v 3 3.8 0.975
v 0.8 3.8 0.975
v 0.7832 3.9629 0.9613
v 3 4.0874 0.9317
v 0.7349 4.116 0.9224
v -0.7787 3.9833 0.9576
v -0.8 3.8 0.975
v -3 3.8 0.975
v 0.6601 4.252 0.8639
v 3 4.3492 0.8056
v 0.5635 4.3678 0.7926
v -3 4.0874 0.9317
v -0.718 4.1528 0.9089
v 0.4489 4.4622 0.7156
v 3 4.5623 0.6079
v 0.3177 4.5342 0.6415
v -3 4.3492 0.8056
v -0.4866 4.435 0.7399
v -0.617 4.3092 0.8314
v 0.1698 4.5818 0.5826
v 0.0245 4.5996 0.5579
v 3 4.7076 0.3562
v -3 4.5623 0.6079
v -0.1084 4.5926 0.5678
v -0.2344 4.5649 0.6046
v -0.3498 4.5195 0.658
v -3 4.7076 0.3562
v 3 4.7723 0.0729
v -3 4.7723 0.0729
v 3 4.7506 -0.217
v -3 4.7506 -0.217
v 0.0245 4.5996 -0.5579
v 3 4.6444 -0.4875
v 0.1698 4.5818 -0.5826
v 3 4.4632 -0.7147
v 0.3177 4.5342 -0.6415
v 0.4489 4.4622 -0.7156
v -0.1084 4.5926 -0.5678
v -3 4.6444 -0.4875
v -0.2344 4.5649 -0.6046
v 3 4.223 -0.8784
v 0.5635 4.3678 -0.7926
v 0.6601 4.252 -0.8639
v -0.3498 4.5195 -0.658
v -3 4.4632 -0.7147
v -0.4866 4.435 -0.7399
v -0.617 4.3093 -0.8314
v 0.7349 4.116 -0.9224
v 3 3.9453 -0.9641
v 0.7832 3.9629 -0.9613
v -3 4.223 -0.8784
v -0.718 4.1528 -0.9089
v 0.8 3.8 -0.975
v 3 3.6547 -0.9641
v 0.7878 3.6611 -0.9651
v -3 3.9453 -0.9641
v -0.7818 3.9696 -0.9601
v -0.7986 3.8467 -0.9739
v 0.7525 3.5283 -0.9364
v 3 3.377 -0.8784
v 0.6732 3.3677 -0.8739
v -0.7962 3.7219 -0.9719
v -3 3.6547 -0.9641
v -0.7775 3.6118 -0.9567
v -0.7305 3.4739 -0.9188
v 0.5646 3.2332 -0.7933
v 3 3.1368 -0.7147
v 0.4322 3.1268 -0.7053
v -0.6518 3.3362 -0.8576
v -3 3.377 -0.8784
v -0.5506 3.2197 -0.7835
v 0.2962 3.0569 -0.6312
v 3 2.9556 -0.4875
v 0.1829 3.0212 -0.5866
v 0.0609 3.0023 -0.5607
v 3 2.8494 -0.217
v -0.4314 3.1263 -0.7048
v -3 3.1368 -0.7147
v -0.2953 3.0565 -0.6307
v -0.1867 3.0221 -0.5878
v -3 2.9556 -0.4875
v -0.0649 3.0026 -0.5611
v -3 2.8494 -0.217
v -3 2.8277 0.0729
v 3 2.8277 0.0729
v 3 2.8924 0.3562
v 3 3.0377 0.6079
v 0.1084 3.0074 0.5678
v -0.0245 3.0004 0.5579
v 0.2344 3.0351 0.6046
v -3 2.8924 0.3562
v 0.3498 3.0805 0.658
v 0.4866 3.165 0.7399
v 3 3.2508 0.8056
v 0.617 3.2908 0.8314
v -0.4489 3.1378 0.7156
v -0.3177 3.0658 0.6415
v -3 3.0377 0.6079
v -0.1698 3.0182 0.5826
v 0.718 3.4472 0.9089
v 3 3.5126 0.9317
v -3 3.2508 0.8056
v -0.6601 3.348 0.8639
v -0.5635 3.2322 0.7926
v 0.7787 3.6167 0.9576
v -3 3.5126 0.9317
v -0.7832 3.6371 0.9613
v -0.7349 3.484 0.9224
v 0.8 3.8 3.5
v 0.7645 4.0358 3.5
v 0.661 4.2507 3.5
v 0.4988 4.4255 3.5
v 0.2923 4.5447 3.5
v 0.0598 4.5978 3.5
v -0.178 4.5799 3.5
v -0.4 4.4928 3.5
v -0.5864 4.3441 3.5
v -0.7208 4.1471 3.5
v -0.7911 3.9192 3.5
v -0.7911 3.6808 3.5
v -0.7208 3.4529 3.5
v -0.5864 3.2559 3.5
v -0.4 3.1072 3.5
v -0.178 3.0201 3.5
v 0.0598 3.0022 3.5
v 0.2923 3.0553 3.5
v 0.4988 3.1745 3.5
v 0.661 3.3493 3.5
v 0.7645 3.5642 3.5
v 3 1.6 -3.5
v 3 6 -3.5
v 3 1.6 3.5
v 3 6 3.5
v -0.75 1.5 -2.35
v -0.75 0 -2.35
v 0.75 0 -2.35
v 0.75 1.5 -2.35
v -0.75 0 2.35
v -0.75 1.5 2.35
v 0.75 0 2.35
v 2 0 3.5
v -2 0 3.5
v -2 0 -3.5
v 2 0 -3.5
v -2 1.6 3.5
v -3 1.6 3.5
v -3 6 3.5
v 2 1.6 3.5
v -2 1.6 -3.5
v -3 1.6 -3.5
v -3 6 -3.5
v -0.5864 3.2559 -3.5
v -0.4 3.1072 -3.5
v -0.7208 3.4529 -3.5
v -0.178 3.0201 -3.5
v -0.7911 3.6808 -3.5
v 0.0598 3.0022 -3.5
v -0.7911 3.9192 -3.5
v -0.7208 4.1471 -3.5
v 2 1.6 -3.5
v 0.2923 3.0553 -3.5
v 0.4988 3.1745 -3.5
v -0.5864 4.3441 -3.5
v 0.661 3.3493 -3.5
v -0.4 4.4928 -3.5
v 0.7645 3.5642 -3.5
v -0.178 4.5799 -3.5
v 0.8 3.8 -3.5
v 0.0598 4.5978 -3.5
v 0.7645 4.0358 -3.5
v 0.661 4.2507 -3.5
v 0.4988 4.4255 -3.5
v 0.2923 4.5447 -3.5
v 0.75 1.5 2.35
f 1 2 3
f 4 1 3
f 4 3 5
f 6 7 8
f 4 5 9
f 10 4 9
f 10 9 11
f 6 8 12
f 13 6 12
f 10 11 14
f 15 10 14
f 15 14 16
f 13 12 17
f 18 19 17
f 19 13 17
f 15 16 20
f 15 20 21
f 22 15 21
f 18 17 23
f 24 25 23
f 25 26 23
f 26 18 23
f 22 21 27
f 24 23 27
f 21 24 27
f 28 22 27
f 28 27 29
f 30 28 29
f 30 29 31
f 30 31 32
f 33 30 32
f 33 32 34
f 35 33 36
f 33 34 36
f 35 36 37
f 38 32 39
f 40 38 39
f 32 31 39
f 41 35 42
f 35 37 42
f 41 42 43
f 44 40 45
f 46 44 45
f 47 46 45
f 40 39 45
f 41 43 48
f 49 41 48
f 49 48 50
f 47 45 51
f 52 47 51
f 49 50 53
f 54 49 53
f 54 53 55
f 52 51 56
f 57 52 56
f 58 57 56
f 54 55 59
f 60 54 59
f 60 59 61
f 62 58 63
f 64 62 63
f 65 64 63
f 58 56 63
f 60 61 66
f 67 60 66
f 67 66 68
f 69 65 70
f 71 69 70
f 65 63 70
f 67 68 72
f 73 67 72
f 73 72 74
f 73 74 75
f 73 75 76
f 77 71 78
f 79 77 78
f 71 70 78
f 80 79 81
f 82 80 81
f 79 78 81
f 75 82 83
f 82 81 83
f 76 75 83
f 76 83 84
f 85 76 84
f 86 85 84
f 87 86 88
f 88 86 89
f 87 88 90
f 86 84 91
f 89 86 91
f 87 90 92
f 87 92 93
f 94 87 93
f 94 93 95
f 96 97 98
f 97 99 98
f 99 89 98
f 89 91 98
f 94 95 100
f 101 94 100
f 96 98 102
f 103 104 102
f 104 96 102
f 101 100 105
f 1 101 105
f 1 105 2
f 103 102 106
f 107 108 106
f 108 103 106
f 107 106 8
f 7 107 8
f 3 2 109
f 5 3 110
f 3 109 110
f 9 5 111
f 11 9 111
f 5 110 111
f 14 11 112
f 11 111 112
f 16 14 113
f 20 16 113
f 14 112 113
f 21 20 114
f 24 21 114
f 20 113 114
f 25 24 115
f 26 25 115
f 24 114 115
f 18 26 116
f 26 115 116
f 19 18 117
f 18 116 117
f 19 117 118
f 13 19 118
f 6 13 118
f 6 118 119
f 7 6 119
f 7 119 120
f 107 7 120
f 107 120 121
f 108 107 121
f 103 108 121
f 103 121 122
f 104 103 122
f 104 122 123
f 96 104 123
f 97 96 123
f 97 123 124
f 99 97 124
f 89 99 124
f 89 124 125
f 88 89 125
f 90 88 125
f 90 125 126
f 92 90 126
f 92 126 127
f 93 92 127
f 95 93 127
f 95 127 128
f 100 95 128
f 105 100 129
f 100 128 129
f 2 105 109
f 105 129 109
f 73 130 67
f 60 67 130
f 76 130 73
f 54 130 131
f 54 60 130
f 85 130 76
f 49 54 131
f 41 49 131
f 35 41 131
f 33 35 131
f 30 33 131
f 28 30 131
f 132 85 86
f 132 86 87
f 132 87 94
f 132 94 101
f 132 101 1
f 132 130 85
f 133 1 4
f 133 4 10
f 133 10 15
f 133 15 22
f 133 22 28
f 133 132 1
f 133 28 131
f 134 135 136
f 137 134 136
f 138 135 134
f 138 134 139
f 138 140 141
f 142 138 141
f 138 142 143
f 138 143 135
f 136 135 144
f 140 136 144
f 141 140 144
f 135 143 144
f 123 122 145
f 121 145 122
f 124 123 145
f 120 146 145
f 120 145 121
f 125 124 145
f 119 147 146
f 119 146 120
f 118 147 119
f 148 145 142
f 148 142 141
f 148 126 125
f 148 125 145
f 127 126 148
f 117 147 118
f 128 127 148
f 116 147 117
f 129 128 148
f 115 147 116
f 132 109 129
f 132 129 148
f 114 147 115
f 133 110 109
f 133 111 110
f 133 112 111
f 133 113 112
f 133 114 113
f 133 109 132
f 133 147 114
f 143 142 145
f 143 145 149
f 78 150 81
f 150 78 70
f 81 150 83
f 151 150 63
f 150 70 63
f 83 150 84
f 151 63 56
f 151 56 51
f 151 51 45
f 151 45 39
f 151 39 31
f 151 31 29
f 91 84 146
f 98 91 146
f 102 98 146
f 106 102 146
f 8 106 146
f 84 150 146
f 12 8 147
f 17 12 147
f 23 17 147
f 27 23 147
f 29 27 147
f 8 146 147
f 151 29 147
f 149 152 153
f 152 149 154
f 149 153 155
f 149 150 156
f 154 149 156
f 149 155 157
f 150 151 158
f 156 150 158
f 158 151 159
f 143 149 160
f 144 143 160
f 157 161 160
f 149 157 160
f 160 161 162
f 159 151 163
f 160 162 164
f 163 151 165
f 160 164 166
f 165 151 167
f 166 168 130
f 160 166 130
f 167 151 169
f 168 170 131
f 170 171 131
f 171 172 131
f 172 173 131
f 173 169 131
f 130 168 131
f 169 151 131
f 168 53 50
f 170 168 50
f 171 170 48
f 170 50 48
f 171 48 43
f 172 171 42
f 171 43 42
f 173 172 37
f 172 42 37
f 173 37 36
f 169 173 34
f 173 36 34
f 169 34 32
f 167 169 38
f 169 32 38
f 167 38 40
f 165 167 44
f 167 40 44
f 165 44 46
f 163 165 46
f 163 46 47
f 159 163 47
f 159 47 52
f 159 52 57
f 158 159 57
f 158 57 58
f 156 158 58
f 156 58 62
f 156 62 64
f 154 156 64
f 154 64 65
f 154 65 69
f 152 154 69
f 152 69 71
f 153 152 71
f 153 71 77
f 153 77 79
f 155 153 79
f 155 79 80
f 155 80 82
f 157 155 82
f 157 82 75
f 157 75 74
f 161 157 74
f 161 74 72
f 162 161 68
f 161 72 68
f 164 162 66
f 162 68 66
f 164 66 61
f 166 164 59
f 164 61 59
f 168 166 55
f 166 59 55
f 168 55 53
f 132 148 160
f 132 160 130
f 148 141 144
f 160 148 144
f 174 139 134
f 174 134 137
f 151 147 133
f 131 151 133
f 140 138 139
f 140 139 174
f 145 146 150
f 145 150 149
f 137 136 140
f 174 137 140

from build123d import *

# Parameters (mm, degrees)
SKETCH1_W           = 4
SKETCH1_H           = 7
BOSS_EXTRUDE1_DEPTH = 6
SKETCH2_W           = 1.5
SKETCH2_H           = 4.7
CUT_EXTRUDE1_DEPTH  = 1.5
CUT_EXTRUDE2_REACH  = 9
SKETCH3_R           = 0.8
SKETCH5_W           = 1
SKETCH5_H           = 4.4
BOSS_EXTRUDE2_DEPTH = 7
SKETCH4_R           = 0.975
CUT_EXTRUDE4_DEPTH  = 7


with BuildPart() as part:
    # Sketch1 → Boss-Extrude1 (new body)
    with BuildSketch(Plane(origin=(0, 0, 0), x_dir=(1, 0, 0), z_dir=(0, 1, 0))):
        Rectangle(SKETCH1_W, SKETCH1_H)
    extrude(amount=BOSS_EXTRUDE1_DEPTH)

    # Sketch2 → Cut-Extrude1 (cut)
    with BuildSketch(Plane.XZ):
        Rectangle(SKETCH2_W, SKETCH2_H)
    extrude(amount=-CUT_EXTRUDE1_DEPTH, mode=Mode.SUBTRACT)

    # Sketch3 → Cut-Extrude2 (cut, up to next)
    with BuildSketch(Plane.XY.offset(3.5), mode=Mode.PRIVATE) as cut_extrude2_sk1:
        with Locations((0, 3.8)):
            Circle(SKETCH3_R)
    cut_extrude2_tool1 = extrude(cut_extrude2_sk1.sketch, amount=-CUT_EXTRUDE2_REACH, mode=Mode.PRIVATE) & part.part
    add(cut_extrude2_tool1.solids().sort_by_distance((0, 3.8, 3.5))[0], mode=Mode.SUBTRACT)

    # Sketch5 → Boss-Extrude2 (add)
    with BuildSketch(Plane.XY.offset(3.5)):
        with Locations((2.5, 3.8)):
            Rectangle(SKETCH5_W, SKETCH5_H)
        with Locations((-2.5, 3.8)):
            Rectangle(SKETCH5_W, SKETCH5_H)
    extrude(amount=-BOSS_EXTRUDE2_DEPTH)

    # Sketch4 → Cut-Extrude4 (cut, through all)
    with BuildSketch(Plane.ZY.offset(3)):
        with Locations((0, 3.8)):
            Circle(SKETCH4_R)
    extrude(amount=-CUT_EXTRUDE4_DEPTH, mode=Mode.SUBTRACT)


solid = part.part
